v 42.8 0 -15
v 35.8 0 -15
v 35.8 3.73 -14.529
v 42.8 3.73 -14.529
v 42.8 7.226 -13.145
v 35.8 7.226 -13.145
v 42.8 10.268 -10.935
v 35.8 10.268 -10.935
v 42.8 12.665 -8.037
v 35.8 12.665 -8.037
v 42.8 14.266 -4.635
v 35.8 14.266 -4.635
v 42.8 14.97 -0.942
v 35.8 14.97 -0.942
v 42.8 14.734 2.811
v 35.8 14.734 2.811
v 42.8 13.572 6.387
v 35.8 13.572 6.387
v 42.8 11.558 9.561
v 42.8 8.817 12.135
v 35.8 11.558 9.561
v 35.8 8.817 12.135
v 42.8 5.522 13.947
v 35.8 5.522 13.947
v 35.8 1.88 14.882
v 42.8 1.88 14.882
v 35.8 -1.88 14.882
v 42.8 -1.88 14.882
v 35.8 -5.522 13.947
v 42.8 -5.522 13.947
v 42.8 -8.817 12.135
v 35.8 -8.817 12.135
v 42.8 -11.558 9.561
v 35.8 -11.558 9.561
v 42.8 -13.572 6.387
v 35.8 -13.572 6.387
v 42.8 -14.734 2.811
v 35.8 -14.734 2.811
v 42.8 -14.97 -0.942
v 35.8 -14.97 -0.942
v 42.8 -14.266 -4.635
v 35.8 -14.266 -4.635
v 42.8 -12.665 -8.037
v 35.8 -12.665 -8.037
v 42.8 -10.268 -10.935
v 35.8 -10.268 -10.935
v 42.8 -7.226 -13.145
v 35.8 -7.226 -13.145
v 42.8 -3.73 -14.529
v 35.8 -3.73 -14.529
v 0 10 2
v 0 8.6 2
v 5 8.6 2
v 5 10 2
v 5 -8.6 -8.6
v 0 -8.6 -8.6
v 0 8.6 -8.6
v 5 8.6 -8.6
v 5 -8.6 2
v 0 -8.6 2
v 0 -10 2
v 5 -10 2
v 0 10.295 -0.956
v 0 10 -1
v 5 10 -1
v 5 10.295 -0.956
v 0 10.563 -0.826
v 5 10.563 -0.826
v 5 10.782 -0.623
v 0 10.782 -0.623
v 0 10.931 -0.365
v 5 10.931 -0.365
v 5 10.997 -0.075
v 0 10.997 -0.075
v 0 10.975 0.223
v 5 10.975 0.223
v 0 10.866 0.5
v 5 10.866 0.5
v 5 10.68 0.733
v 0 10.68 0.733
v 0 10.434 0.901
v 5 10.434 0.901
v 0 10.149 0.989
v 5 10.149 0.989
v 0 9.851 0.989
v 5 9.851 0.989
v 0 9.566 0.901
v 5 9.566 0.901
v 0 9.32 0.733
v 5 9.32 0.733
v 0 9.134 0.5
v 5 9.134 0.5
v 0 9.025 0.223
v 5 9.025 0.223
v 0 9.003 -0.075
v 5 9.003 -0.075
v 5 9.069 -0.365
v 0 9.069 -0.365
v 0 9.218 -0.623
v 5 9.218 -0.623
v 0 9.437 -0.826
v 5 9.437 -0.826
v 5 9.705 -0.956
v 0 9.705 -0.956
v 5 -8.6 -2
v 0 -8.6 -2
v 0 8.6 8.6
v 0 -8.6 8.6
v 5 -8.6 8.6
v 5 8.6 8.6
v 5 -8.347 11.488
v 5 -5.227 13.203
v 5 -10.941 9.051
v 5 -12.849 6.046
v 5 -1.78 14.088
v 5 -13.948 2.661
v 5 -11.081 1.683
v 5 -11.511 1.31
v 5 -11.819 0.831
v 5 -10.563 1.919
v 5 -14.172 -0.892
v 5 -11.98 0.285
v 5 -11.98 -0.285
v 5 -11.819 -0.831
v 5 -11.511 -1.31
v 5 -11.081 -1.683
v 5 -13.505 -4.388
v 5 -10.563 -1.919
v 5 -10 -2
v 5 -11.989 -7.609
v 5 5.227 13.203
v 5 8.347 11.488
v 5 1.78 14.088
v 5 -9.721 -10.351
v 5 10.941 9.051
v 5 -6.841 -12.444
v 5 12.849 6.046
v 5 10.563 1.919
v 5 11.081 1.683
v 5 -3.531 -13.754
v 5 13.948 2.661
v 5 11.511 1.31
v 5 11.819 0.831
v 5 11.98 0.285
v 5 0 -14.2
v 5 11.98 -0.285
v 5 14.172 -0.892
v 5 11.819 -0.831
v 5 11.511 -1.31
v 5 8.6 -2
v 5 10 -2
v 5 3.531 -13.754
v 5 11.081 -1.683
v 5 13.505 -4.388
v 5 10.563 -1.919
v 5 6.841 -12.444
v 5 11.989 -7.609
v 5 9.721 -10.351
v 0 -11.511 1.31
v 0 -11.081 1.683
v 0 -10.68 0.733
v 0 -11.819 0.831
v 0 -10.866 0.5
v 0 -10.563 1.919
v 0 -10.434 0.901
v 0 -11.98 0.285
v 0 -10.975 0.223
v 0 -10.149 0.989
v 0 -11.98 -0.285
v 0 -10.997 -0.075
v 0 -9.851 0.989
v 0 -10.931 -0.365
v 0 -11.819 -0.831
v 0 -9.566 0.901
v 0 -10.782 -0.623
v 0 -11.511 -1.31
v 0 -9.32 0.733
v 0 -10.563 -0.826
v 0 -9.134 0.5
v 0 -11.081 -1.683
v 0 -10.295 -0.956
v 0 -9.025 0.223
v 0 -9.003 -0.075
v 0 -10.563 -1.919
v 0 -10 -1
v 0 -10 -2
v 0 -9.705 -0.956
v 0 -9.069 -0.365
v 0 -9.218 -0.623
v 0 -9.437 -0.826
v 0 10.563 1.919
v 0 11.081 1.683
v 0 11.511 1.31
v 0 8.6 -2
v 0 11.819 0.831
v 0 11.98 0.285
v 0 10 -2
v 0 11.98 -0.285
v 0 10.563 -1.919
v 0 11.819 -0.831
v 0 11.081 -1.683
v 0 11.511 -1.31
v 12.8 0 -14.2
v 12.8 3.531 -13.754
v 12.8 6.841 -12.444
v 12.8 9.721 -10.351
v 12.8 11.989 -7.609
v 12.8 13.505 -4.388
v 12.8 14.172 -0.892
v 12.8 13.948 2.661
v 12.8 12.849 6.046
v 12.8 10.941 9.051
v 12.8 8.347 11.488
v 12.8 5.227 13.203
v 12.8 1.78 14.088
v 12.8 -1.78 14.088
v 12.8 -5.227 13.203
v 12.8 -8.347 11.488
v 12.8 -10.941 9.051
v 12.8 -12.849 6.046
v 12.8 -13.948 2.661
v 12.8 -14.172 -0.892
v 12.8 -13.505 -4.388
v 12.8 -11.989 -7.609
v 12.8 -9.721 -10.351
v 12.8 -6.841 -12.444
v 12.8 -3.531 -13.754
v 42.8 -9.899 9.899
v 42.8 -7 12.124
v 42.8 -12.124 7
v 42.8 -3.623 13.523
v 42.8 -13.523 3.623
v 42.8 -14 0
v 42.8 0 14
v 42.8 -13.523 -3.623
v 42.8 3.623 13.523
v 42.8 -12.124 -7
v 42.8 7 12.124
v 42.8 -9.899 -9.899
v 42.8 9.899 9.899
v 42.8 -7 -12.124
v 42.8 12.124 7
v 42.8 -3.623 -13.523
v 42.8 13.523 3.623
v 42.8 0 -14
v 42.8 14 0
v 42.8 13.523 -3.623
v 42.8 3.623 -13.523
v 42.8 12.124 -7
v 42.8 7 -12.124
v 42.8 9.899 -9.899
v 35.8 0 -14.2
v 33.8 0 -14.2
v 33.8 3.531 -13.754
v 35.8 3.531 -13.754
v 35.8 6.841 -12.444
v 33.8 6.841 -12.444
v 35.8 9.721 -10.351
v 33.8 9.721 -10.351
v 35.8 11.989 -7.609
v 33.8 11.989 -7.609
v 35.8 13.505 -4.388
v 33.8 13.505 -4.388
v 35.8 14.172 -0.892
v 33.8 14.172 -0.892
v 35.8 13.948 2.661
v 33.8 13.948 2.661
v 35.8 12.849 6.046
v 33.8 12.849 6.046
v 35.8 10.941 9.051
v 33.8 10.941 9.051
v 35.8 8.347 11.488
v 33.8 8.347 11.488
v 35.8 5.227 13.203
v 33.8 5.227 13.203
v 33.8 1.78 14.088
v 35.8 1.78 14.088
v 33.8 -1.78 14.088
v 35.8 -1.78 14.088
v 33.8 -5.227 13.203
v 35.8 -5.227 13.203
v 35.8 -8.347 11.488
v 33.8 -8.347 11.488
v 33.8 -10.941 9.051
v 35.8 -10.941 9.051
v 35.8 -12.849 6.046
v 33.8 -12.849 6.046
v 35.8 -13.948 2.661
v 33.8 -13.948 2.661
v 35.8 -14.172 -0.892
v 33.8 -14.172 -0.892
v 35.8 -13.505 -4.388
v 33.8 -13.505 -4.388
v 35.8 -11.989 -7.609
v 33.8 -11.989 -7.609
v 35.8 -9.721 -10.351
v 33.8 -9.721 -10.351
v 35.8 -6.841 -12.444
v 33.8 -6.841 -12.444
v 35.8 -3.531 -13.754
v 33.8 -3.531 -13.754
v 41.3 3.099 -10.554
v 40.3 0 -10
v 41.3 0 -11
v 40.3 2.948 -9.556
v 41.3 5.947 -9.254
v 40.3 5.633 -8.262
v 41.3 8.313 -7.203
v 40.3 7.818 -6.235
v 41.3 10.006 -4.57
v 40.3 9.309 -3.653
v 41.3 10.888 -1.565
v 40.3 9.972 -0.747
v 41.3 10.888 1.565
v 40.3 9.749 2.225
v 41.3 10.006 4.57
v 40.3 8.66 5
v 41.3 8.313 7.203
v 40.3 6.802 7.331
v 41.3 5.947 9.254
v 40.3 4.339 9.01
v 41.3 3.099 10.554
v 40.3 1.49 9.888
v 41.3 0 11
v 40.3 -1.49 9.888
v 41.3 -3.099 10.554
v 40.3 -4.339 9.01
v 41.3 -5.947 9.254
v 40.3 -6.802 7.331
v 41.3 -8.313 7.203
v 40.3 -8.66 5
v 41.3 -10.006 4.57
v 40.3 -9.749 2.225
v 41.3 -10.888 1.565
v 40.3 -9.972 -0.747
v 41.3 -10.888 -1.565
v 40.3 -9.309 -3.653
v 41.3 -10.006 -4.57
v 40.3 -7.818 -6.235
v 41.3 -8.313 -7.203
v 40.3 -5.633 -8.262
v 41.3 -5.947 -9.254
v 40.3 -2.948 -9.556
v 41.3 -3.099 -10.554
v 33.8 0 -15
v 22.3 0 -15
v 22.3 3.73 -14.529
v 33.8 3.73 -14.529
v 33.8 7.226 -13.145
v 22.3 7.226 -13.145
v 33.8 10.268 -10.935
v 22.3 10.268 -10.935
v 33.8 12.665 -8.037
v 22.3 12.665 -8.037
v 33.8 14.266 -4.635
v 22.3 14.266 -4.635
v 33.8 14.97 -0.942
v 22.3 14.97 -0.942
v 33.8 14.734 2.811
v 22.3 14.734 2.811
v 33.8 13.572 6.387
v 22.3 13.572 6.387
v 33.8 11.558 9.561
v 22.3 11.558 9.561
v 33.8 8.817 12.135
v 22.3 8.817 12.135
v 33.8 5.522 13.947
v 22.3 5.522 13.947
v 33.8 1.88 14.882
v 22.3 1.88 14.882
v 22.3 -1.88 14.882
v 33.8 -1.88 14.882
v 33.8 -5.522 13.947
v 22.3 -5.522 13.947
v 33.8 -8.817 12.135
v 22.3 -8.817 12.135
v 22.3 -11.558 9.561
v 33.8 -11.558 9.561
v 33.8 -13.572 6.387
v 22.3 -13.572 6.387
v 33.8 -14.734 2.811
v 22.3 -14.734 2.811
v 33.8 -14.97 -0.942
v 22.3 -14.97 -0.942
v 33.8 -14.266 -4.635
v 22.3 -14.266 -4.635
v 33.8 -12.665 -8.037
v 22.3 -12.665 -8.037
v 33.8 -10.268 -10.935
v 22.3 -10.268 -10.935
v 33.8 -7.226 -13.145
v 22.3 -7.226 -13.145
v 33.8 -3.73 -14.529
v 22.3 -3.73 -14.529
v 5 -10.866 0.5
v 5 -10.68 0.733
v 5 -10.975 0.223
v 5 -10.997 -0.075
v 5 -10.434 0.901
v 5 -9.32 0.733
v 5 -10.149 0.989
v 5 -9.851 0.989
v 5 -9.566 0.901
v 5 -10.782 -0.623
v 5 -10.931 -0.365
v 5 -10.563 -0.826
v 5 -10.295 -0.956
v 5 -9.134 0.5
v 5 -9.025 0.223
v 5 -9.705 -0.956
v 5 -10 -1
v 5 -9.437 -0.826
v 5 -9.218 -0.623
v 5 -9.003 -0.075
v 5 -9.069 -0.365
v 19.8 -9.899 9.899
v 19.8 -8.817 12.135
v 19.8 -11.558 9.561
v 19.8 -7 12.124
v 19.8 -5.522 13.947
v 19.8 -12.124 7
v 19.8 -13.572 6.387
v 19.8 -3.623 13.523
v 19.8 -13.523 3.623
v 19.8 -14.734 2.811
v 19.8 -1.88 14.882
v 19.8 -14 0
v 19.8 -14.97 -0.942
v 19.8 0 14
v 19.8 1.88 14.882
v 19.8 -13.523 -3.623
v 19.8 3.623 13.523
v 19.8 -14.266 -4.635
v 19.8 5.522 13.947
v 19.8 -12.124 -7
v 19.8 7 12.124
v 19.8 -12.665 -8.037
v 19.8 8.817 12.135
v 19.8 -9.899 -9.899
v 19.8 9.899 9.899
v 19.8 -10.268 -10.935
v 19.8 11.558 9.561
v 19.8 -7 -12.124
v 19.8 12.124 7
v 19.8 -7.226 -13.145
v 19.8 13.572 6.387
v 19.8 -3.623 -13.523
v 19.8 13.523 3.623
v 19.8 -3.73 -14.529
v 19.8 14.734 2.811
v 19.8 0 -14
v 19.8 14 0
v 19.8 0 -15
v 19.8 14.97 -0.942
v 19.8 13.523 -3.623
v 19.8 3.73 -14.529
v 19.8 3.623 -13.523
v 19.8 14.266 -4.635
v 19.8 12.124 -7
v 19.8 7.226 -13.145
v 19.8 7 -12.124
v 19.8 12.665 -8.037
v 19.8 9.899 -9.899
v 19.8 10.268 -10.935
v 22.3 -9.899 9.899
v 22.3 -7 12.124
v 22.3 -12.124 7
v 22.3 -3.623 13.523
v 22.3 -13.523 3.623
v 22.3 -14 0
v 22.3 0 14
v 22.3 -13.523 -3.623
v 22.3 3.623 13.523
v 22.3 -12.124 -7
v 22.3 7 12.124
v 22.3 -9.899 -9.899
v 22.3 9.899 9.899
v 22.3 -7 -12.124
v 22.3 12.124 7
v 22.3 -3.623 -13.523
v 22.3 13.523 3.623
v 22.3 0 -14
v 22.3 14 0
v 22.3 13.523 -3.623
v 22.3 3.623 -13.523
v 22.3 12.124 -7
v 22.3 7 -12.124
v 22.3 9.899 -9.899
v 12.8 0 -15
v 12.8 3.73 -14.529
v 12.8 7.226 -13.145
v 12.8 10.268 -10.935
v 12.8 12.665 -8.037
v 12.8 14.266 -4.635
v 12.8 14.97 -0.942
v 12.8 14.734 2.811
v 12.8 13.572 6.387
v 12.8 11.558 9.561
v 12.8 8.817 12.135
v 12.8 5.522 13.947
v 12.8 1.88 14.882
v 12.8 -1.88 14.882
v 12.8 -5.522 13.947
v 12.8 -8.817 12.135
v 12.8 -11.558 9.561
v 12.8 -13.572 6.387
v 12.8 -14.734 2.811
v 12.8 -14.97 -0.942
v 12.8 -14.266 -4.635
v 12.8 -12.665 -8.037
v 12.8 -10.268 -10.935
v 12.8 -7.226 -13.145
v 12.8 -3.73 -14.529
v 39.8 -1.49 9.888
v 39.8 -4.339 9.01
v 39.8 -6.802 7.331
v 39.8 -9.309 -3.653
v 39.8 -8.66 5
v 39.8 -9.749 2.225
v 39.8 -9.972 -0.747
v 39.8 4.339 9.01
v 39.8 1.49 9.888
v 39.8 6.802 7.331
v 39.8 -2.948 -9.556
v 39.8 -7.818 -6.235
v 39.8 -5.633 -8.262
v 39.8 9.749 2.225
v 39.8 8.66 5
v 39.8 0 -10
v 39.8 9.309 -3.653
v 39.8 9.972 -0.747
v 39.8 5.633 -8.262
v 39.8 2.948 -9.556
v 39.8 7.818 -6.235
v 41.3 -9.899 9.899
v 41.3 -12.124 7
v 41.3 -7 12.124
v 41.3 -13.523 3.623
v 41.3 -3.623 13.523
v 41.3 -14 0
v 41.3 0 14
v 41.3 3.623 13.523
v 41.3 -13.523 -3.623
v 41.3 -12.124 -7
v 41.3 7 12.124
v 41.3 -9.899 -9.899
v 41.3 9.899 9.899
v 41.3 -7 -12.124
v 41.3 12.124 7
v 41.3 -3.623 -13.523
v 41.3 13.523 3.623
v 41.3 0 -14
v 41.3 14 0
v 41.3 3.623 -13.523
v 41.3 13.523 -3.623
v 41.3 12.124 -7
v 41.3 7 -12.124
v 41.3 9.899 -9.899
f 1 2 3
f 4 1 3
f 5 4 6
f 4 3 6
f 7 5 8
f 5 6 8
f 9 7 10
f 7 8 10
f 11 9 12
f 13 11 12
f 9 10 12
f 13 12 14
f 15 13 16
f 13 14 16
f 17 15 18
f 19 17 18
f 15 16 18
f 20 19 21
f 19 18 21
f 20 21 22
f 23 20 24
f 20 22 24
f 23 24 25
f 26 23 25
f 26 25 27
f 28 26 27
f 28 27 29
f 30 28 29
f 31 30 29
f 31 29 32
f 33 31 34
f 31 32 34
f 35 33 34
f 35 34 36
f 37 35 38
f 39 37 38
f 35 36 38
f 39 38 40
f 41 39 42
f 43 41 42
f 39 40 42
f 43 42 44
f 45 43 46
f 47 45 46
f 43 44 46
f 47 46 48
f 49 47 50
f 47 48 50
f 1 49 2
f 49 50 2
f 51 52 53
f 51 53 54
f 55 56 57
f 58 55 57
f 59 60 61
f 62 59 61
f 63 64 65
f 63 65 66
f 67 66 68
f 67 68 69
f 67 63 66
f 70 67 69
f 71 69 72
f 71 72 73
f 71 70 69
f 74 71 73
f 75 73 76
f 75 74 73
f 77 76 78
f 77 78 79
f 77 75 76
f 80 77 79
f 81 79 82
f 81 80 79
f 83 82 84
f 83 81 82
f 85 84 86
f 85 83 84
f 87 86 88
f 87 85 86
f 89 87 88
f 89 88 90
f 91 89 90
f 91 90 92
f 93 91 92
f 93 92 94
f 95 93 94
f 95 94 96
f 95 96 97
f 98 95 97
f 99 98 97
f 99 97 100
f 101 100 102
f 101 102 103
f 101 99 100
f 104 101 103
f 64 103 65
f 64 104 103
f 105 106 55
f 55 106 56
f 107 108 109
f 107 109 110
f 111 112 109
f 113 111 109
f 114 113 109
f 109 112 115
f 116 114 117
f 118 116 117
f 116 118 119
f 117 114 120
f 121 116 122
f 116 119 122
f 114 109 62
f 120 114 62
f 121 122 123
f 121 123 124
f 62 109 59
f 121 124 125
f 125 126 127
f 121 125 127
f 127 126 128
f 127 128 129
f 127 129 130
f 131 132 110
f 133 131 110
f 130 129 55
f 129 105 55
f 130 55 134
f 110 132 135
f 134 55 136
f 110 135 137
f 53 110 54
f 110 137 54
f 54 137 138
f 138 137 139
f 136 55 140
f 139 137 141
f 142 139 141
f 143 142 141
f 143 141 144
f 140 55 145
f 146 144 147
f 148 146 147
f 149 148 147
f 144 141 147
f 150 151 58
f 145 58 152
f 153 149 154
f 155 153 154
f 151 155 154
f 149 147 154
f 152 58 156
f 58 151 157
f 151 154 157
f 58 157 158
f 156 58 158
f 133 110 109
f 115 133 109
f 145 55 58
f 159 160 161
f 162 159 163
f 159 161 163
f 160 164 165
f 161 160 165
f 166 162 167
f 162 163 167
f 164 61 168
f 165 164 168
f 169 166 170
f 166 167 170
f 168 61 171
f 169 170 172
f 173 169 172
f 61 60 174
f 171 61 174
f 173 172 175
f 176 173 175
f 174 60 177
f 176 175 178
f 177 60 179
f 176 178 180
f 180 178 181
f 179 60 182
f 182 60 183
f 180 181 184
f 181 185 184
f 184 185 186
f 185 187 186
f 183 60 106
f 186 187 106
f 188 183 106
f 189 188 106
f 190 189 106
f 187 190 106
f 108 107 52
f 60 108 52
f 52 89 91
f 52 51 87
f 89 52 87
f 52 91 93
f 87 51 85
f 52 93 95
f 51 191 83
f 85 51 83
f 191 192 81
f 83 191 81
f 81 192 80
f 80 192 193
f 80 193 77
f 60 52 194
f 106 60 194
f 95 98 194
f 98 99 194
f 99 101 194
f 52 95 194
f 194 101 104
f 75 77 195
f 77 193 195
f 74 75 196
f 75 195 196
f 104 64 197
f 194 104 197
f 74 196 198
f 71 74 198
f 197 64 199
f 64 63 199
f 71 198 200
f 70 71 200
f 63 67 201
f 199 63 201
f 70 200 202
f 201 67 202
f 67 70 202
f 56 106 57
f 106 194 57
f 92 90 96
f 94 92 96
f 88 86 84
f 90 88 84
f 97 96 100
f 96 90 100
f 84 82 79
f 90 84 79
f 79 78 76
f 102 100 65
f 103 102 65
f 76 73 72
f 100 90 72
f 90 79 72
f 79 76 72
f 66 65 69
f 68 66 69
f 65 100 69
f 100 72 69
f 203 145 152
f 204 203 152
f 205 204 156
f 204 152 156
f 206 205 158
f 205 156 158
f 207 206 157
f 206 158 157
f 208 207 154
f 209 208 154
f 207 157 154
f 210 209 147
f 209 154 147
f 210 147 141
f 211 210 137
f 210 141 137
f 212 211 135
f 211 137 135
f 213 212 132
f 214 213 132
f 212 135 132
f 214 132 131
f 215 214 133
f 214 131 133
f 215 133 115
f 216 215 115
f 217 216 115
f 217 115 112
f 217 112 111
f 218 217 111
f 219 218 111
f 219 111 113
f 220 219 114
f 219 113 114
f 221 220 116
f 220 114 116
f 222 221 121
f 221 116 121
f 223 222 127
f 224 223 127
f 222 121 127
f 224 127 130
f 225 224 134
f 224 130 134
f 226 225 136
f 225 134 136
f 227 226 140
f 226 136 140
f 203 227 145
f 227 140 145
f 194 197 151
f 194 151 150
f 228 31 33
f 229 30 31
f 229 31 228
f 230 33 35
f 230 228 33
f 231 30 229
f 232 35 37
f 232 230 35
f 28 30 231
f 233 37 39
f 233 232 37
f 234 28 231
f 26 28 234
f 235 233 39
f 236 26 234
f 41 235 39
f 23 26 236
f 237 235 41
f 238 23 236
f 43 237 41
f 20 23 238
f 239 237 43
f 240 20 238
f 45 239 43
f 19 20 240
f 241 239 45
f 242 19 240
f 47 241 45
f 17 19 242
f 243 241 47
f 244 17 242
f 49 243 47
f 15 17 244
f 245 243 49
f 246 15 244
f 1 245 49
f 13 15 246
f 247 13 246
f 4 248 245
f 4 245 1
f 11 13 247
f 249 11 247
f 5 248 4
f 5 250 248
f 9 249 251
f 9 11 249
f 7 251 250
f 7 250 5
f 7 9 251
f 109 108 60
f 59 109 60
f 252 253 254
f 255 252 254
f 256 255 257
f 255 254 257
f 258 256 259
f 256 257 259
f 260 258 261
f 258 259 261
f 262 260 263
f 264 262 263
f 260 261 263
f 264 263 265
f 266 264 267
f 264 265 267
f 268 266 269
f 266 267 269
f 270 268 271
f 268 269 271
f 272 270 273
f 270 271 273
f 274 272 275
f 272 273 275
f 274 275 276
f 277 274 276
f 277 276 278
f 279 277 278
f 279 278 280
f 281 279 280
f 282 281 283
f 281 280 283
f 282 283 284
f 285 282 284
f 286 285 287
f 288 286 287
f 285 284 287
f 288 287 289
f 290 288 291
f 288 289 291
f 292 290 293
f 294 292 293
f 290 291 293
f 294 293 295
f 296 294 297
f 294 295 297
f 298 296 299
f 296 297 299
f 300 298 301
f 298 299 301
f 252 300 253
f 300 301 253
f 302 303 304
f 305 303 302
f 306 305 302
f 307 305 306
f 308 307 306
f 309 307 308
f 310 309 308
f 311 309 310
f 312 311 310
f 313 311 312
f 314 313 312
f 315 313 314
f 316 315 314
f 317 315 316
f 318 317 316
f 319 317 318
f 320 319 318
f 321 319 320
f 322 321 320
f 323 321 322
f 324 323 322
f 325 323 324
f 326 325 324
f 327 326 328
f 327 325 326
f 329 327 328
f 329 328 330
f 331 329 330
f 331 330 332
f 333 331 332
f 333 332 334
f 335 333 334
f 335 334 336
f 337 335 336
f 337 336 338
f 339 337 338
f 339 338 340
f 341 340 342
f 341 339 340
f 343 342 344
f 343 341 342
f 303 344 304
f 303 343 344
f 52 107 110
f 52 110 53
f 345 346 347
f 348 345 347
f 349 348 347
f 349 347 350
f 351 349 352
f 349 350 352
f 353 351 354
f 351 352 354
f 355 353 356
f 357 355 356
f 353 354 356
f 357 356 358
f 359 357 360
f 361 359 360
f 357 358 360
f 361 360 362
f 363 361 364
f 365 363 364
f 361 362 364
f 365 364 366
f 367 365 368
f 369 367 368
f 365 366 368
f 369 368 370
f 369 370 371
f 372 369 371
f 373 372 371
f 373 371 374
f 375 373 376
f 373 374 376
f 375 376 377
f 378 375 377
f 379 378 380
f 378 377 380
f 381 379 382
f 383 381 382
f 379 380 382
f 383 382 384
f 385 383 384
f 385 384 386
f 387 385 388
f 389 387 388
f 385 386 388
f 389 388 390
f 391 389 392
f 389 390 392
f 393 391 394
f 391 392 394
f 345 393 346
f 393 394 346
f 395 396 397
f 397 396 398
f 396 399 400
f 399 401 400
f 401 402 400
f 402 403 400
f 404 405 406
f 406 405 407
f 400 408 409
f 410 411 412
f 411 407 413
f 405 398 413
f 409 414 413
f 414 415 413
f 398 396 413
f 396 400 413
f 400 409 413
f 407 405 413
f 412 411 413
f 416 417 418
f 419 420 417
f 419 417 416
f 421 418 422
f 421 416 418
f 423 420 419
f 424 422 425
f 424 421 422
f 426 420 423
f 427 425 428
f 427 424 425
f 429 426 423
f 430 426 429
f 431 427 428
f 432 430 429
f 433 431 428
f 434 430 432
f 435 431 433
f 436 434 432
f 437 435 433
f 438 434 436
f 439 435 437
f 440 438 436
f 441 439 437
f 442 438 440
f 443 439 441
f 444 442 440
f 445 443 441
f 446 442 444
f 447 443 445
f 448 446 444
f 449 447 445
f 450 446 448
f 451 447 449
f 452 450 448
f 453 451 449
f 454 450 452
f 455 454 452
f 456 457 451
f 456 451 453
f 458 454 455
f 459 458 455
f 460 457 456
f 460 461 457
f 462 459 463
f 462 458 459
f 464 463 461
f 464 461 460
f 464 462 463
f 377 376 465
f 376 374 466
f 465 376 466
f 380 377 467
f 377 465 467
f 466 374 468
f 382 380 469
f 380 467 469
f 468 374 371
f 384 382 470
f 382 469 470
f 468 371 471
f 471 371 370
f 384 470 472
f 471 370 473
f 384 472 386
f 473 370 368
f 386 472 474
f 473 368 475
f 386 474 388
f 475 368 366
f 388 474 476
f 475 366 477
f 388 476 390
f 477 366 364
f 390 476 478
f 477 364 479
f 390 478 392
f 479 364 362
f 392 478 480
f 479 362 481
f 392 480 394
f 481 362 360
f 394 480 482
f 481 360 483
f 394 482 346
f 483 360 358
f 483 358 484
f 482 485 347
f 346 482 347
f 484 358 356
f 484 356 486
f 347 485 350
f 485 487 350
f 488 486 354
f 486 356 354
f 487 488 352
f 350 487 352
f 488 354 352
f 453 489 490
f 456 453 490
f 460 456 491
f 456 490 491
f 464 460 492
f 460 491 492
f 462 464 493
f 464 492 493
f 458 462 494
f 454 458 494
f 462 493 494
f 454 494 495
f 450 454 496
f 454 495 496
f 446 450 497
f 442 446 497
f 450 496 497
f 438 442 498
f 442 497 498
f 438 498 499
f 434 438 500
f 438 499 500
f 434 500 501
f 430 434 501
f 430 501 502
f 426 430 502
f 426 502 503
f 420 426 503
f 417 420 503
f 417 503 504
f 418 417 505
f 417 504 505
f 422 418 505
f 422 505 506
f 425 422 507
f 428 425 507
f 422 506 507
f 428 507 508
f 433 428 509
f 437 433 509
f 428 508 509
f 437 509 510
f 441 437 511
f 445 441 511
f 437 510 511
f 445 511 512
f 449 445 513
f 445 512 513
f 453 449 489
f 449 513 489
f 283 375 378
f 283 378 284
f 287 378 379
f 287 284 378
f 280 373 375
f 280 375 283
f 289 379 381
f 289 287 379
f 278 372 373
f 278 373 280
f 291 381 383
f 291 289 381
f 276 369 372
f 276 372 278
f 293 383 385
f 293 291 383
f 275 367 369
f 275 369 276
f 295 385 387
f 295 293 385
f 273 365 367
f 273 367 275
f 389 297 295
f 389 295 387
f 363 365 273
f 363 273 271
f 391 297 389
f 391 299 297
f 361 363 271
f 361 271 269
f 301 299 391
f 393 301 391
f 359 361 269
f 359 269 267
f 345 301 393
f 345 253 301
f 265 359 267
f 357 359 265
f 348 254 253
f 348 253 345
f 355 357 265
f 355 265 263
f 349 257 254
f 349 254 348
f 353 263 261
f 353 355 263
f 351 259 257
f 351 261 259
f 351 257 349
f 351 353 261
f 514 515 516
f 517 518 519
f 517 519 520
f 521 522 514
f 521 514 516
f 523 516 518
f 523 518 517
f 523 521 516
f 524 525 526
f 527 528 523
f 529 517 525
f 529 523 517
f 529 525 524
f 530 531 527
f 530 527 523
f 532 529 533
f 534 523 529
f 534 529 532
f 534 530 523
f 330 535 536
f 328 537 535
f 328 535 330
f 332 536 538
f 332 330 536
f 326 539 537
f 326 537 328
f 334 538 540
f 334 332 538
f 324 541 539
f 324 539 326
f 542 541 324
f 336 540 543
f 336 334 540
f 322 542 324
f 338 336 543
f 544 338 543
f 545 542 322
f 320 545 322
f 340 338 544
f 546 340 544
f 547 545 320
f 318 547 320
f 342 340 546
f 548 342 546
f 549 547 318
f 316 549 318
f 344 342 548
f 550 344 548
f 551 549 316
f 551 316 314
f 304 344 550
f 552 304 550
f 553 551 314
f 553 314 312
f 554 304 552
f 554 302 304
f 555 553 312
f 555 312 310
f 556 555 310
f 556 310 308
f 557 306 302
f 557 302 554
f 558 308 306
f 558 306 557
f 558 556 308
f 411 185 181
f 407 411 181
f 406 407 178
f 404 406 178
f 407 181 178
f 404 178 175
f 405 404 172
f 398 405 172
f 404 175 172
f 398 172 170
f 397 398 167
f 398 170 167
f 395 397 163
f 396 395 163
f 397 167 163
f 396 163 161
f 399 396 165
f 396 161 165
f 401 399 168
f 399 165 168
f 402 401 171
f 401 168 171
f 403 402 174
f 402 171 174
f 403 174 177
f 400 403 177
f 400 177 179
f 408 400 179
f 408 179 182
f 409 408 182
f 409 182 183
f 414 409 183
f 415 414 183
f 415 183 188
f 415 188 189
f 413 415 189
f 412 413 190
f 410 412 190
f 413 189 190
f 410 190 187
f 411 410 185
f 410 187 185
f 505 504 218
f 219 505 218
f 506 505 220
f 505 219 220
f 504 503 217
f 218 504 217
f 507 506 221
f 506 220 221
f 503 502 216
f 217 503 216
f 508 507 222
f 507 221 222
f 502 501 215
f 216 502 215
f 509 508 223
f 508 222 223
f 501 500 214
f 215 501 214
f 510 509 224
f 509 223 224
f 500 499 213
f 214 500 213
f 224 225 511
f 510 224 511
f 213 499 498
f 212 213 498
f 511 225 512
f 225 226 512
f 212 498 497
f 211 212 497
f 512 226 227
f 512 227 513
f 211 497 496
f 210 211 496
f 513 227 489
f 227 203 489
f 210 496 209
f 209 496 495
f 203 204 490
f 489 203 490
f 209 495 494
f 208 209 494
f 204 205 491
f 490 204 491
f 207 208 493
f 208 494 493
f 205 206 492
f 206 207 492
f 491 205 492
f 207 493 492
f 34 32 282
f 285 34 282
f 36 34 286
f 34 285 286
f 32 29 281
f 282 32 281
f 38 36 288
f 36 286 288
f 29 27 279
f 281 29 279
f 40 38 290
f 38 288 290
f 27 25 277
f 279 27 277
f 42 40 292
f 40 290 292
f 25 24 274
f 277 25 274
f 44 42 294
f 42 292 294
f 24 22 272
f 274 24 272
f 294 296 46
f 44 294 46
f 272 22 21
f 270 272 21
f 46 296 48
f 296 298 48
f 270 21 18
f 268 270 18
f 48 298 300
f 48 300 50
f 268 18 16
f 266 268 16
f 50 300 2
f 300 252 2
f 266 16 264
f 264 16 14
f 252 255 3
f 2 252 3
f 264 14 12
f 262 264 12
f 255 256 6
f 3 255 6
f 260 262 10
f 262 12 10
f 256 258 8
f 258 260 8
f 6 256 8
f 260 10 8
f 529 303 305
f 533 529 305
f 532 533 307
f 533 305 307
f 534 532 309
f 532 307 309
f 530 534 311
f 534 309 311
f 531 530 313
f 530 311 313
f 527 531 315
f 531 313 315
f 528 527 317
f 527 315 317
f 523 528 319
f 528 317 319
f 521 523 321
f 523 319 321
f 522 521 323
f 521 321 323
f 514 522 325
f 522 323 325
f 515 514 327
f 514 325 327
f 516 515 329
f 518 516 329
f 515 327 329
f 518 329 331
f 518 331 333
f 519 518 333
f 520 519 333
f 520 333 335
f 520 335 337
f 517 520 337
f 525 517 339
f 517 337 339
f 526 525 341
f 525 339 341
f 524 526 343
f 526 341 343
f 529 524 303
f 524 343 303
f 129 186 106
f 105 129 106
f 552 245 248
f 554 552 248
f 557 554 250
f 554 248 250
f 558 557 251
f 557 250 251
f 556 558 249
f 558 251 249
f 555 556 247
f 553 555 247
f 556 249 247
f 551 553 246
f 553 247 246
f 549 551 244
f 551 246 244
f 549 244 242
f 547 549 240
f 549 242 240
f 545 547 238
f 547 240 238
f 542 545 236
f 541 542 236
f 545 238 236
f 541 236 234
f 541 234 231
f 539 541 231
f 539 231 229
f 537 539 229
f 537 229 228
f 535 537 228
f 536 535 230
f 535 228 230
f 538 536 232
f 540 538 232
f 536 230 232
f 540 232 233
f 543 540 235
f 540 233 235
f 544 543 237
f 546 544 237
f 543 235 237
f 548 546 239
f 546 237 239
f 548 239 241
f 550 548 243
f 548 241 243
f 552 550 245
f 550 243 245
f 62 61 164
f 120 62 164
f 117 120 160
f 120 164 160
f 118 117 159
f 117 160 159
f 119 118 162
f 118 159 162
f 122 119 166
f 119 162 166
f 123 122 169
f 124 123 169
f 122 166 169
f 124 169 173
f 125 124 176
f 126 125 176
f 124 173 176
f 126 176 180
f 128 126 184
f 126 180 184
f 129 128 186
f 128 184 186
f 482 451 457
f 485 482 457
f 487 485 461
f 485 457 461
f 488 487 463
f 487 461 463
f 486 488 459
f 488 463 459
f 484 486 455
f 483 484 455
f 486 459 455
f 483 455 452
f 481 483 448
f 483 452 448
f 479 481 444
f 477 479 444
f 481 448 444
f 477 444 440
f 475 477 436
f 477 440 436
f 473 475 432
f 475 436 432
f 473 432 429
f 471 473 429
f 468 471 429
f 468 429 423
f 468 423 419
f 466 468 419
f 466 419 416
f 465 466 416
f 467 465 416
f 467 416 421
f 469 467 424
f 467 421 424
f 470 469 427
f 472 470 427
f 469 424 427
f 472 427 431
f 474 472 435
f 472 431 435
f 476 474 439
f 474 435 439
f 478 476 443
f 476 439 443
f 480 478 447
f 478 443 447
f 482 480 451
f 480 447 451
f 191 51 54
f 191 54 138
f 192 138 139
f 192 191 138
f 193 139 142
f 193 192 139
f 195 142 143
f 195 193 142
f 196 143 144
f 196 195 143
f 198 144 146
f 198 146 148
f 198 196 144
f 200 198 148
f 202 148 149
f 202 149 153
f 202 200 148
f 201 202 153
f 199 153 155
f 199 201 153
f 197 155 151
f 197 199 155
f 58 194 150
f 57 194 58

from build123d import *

# Parameters (mm, degrees)
ESQUISSE1_W             = 17.2
ESQUISSE1_H             = 17.2
BOSS_EXTRU_1_DEPTH      = 5
ESQUISSE2_R             = 1
BOSS_EXTRU_2_DEPTH      = 5
ESQUISSE3_R             = 14.2
BOSS_EXTRU_3_DEPTH      = 7.8
ESQUISSE4_R             = 15
BOSS_EXTRU_4_DEPTH      = 7
ESQUISSE5_R             = 14
BOSS_EXTRU_5_DEPTH      = 2.5
ESQUISSE6_R             = 15
BOSS_EXTRU_6_DEPTH      = 11.5
ESQUISSE7_R             = 14.2
BOSS_EXTRU_7_DEPTH      = 2
ESQUISSE8_R             = 15
BOSS_EXTRU_8_DEPTH      = 7
ESQUISSE9_R             = 14
ENL_V_MAT_EXTRU_1_DEPTH = 1.5
ESQUISSE10_R            = 10
ENL_V_MAT_EXTRU_2_DEPTH = 1.5
CHANFREIN1_SIZE         = 1


with BuildPart() as part:
    # Esquisse1 → Boss.-Extru.1 (new body)
    with BuildSketch(Plane(origin=(0, 0, 0), x_dir=(0, 0, -1), z_dir=(1, 0, 0))):
        Rectangle(ESQUISSE1_W, ESQUISSE1_H)
    extrude(amount=BOSS_EXTRU_1_DEPTH)

    # Esquisse2 → Boss.-Extru.2 (add)
    with BuildSketch(Plane(origin=(0, 0, 0), x_dir=(0, 0, -1), z_dir=(1, 0, 0))):
        with BuildLine():
            Line((-2, 8.6), (-2, 10))
            ThreePointArc((-2, 10), (0, 12), (2, 10))
            Line((2, 10), (2, 8.6))
            Line((2, 8.6), (-2, 8.6))
        make_face()
        with Locations((0, 10)):
            Circle(ESQUISSE2_R, mode=Mode.SUBTRACT)
    boss_extru_2 = extrude(amount=BOSS_EXTRU_2_DEPTH)

    # Symétrie1: Boss.-Extru.2 across plane
    add(boss_extru_2.mirror(Plane.ZX))

    # Esquisse3 → Boss.-Extru.3 (add)
    with BuildSketch(Plane(origin=(5, 0, 0), x_dir=(0, 0, -1), z_dir=(1, 0, 0))):
        Circle(ESQUISSE3_R)
    extrude(amount=BOSS_EXTRU_3_DEPTH)

    # Esquisse4 → Boss.-Extru.4 (add)
    with BuildSketch(Plane(origin=(12.8, 0, 0), x_dir=(0, 0, -1), z_dir=(1, 0, 0))):
        Circle(ESQUISSE4_R)
    extrude(amount=BOSS_EXTRU_4_DEPTH)

    # Esquisse5 → Boss.-Extru.5 (add)
    with BuildSketch(Plane(origin=(19.8, 0, 0), x_dir=(0, 0, -1), z_dir=(1, 0, 0))):
        Circle(ESQUISSE5_R)
    extrude(amount=BOSS_EXTRU_5_DEPTH)

    # Esquisse6 → Boss.-Extru.6 (add)
    with BuildSketch(Plane(origin=(22.3, 0, 0), x_dir=(0, 0, -1), z_dir=(1, 0, 0))):
        Circle(ESQUISSE6_R)
    extrude(amount=BOSS_EXTRU_6_DEPTH)

    # Esquisse7 → Boss.-Extru.7 (add)
    with BuildSketch(Plane(origin=(33.8, 0, 0), x_dir=(0, 0, -1), z_dir=(1, 0, 0))):
        Circle(ESQUISSE7_R)
    extrude(amount=BOSS_EXTRU_7_DEPTH)

    # Esquisse8 → Boss.-Extru.8 (add)
    with BuildSketch(Plane(origin=(35.8, 0, 0), x_dir=(0, 0, -1), z_dir=(1, 0, 0))):
        Circle(ESQUISSE8_R)
    extrude(amount=BOSS_EXTRU_8_DEPTH)

    # Esquisse9 → Enlèv. mat.-Extru.1 (cut)
    with BuildSketch(Plane(origin=(42.8, 0, 0), x_dir=(0, 0, -1), z_dir=(1, 0, 0))):
        Circle(ESQUISSE9_R)
    extrude(amount=-ENL_V_MAT_EXTRU_1_DEPTH, mode=Mode.SUBTRACT)

    # Esquisse10 → Enlèv. mat.-Extru.2 (cut)
    with BuildSketch(Plane(origin=(41.3, 0, 0), x_dir=(0, 0, -1), z_dir=(1, 0, 0))):
        Circle(ESQUISSE10_R)
    extrude(amount=-ENL_V_MAT_EXTRU_2_DEPTH, mode=Mode.SUBTRACT)

    # Chanfrein1
    chanfrein1_edges = [part.edges().sort_by_distance(p)[0] for p in [
        (41.3, 0, 10),
    ]]
    chamfer(chanfrein1_edges, length=CHANFREIN1_SIZE)


solid = part.part
